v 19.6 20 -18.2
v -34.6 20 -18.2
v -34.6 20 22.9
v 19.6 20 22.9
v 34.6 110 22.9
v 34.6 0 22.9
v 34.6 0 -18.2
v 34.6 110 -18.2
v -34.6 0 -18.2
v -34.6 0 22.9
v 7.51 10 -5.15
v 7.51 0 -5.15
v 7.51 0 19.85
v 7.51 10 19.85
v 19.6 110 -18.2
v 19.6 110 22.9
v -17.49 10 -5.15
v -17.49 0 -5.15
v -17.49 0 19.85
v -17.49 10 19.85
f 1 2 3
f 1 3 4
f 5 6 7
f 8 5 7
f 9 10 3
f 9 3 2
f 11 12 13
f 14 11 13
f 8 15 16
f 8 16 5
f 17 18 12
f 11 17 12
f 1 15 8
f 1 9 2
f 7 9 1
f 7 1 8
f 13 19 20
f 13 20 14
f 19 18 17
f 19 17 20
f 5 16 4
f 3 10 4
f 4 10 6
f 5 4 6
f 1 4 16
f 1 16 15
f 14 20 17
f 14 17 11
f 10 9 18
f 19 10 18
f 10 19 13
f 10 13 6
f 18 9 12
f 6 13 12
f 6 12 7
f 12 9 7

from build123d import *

# Parameters (mm, degrees)
SKETCH4_W            = 69.2
SKETCH4_H            = 45.8
SKETCH4_W_2          = 30
SKETCH4_H_2          = 30
BOSS_EXTRUDE11_DEPTH = 10
SKETCH9_W            = 69.2
SKETCH9_H            = 45.8
BOSS_EXTRUDE12_DEPTH = 10
SKETCH10_W           = 15
SKETCH10_H           = 45.8
BOSS_EXTRUDE13_DEPTH = 100
MOVE_FACE2_BY        = 4.7
MOVE_FACE3_BY        = 10
SKETCH11_W           = 25
SKETCH11_H           = 25
CUT_EXTRUDE1_DEPTH   = 10
MOVE_FACE4_BY        = 10


with BuildPart() as part:
    # Sketch4 → Boss-Extrude11 (new body)
    with BuildSketch(Plane(origin=(0, 0, 0), x_dir=(1, 0, 0), z_dir=(0, 1, 0))):
        Rectangle(SKETCH4_W, SKETCH4_H)
        Rectangle(SKETCH4_W_2, SKETCH4_H_2, mode=Mode.SUBTRACT)
    extrude(amount=BOSS_EXTRUDE11_DEPTH)

    # Sketch9 → Boss-Extrude12 (add)
    with BuildSketch(Plane(origin=(0, 10, 0), x_dir=(1, 0, 0), z_dir=(0, 1, 0))):
        Rectangle(SKETCH9_W, SKETCH9_H)
    extrude(amount=BOSS_EXTRUDE12_DEPTH)

    # Sketch10 → Boss-Extrude13 (add)
    with BuildSketch(Plane(origin=(0, 20, 0), x_dir=(1, 0, 0), z_dir=(0, 1, 0))):
        with Locations((27.1, 0)):
            Rectangle(SKETCH10_W, SKETCH10_H)
    extrude(amount=BOSS_EXTRUDE13_DEPTH)

    # Move Face2: a face moved inward by 4.7
    extrude(part.faces().sort_by_distance((0, 12, -22.9))[0], amount=MOVE_FACE2_BY, dir=(0, 0, 1), mode=Mode.SUBTRACT)

    # Move Face3: a face moved outward by 10.0
    extrude(part.faces().sort_by_distance((0, 10, 0))[0], amount=MOVE_FACE3_BY, dir=(0, -1, 0))

    # Sketch11 → Cut-Extrude1 (cut)
    with BuildSketch(Plane.XZ):
        with Locations((-4.99, 7.35)):
            Rectangle(SKETCH11_W, SKETCH11_H)
    extrude(amount=-CUT_EXTRUDE1_DEPTH, mode=Mode.SUBTRACT)

    # Move Face4: a face moved inward by 10.0
    extrude(part.faces().sort_by_distance((27.1, 120, 2.35))[0], amount=MOVE_FACE4_BY, dir=(0, -1, 0), mode=Mode.SUBTRACT)


solid = part.part
